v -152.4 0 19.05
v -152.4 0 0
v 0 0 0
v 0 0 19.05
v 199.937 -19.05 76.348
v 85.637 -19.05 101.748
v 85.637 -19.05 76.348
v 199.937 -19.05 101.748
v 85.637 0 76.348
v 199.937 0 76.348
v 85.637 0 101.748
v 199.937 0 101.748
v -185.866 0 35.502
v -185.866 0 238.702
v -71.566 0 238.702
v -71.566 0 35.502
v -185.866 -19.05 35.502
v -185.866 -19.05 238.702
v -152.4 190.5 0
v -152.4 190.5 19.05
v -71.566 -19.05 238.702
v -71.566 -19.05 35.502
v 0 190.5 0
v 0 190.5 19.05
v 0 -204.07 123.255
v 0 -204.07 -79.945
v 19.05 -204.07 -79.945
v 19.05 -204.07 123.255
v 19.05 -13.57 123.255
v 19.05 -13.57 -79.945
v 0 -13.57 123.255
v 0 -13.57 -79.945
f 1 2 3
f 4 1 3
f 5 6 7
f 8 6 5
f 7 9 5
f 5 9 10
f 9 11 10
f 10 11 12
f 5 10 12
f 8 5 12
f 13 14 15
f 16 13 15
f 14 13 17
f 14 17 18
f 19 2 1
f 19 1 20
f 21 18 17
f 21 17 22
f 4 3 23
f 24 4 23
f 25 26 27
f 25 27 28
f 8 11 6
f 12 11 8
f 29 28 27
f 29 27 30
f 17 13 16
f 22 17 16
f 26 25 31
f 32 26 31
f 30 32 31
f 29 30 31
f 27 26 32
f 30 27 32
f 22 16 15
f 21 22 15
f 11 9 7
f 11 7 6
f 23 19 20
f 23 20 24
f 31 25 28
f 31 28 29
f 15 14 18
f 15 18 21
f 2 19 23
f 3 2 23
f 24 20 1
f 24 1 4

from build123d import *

# Parameters (mm, degrees)
F0_W     = 152.4
F0_H     = 190.5
F1_DEPTH = 19.05
F2_W     = 114.3
F2_H     = 203.2
F3_DEPTH = 19.05
F4_W     = 190.5
F4_H     = 203.2
F5_DEPTH = 19.05
F6_W     = 114.3
F6_H     = 25.4
F7_DEPTH = 19.05


with BuildPart() as f1:
    # F0 (on Top) → F1 (new body)
    with BuildSketch(Plane.XY):
        with Locations((-76.2, 95.25)):
            Rectangle(F0_W, F0_H)
    extrude(amount=F1_DEPTH)


with BuildPart() as f3:
    # F2 (on Front) → F3 (new body)
    with BuildSketch(Plane.XZ):
        with Locations((-128.716405, 137.102477)):
            Rectangle(F2_W, F2_H)
    extrude(amount=F3_DEPTH)


with BuildPart() as f5:
    # F4 (on Right) → F5 (new body)
    with BuildSketch(Plane.YZ):
        with Locations((-108.820379, 21.65452)):
            Rectangle(F4_W, F4_H)
    extrude(amount=F5_DEPTH)


with BuildPart() as f7:
    # F6 (on Front) → F7 (new body)
    with BuildSketch(Plane.XZ):
        with Locations((142.786687, 89.048289)):
            Rectangle(F6_W, F6_H)
    extrude(amount=F7_DEPTH)


solid = Compound([f1.part, f3.part, f5.part, f7.part])
